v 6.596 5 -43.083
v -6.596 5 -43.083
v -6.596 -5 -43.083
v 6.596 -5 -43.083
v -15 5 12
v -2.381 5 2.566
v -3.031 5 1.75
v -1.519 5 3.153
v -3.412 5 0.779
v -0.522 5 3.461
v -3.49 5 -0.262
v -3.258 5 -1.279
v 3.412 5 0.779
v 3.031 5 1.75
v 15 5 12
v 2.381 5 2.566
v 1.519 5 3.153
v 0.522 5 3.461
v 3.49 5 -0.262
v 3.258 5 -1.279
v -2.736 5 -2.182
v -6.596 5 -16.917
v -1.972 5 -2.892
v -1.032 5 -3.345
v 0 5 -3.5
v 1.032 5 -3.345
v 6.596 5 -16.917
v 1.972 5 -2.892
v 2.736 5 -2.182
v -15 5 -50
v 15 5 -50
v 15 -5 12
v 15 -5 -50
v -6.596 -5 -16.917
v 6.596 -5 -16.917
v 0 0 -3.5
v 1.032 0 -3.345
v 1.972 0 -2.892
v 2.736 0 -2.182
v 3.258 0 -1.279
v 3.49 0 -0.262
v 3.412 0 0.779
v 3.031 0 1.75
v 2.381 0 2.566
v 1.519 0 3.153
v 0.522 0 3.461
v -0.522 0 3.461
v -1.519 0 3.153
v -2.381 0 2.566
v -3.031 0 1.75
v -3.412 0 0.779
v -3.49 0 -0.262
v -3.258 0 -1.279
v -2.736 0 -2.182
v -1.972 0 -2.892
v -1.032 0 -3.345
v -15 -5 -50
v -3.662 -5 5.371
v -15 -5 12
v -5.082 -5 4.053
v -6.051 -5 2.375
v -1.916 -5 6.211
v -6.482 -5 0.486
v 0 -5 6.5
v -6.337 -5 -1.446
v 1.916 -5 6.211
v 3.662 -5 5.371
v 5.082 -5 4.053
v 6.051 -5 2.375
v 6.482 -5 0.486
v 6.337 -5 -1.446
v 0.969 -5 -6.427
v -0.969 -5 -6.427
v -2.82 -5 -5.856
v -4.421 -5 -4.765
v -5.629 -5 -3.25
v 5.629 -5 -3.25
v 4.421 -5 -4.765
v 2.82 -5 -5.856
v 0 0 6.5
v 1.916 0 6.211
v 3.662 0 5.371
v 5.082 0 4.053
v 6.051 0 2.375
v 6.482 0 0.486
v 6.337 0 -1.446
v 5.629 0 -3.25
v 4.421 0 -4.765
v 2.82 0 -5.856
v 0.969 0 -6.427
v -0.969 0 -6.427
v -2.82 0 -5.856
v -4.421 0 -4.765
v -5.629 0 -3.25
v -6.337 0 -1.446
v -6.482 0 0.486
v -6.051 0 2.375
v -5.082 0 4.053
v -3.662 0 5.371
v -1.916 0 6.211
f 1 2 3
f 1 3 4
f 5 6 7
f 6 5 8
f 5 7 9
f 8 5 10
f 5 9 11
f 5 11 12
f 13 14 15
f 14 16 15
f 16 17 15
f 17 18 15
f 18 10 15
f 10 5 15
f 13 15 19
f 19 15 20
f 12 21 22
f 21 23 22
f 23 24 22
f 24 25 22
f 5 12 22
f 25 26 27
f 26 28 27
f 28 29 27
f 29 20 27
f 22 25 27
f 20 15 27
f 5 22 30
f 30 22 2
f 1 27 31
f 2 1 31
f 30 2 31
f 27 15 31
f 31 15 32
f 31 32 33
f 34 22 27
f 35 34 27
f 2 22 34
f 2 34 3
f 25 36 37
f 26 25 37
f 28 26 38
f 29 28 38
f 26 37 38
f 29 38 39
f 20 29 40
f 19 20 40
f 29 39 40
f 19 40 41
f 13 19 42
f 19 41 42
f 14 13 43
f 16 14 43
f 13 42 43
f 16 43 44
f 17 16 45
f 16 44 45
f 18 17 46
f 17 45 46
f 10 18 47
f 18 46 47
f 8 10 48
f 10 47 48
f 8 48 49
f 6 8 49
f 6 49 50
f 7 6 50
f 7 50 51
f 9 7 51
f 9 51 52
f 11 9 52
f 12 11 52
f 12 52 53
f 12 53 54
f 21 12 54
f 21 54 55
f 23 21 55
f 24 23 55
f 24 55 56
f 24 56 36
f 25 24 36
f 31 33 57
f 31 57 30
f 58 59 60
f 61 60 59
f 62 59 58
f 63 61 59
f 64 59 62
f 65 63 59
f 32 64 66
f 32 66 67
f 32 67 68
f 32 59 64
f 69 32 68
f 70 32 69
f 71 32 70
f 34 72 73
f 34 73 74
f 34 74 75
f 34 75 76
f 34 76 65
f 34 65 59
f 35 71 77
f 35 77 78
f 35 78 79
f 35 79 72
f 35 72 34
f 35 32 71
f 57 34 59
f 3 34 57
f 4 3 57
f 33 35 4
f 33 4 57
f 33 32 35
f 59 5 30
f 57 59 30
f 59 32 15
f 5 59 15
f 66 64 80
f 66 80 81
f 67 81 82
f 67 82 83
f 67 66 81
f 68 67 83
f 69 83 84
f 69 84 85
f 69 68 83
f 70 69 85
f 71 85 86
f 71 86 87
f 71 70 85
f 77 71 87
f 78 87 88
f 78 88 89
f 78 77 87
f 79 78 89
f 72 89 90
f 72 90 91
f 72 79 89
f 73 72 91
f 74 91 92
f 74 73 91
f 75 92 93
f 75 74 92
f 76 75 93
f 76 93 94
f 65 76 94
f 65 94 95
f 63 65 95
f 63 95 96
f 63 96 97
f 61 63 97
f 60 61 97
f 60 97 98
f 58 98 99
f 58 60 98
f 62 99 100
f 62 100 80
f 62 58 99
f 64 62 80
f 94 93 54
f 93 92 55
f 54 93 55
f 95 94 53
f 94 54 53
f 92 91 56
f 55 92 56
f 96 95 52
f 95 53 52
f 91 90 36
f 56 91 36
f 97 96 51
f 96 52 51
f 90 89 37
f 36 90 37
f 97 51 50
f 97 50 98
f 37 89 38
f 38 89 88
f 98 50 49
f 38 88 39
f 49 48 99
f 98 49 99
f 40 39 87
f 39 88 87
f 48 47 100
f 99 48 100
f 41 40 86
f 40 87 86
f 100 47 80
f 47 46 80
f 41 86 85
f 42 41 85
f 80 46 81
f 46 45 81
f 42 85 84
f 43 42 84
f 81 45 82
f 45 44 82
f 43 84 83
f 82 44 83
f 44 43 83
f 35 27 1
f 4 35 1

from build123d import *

# Parameters (mm, degrees)
SKETCH_1_W          = 62
SKETCH_1_H          = 10
EXTRUDE_1_DEPTH     = 15
SKETCH_2_R          = 6.5
CUT_EXTRUDE_1_DEPTH = 5
SKETCH_4_R          = 3.5
CUT_EXTRUDE_3_DEPTH = 53.440442409
SKETCH_3_W          = 13.191362224
SKETCH_3_H          = 26.166472608
CUT_EXTRUDE_2_DEPTH = 54.150729064


with BuildPart() as part:
    # 草图1 → 凸台-拉伸1 (new, symmetric)
    with BuildSketch(Plane(origin=(0, 0, 0), x_dir=(0, 0, -1), z_dir=(1, 0, 0))):
        with Locations((19, 0)):
            Rectangle(SKETCH_1_W, SKETCH_1_H)
    extrude(amount=EXTRUDE_1_DEPTH, both=True)

    # 草图2 → 切除-拉伸1 (cut)
    with BuildSketch(Plane(origin=(0, -5, 0), x_dir=(1, 0, 0), z_dir=(0, 1, 0))):
        with Locations(Location((0, 0, 0), (0, 0, 270))):
            Circle(SKETCH_2_R)
    extrude(amount=CUT_EXTRUDE_1_DEPTH, mode=Mode.SUBTRACT)

    # 草图4 → 切除-拉伸3 (cut, through all)
    with BuildSketch(Plane.XZ):
        with Locations(Location((0, 0, 0), (0, 0, 270))):
            Circle(SKETCH_4_R)
    extrude(amount=-CUT_EXTRUDE_3_DEPTH, mode=Mode.SUBTRACT)

    # 草图3 → 切除-拉伸2 (cut, through all)
    with BuildSketch(Plane(origin=(0, 5, 0), x_dir=(1, 0, 0), z_dir=(0, 1, 0))):
        with Locations((0, 30)):
            Rectangle(SKETCH_3_W, SKETCH_3_H)
    extrude(amount=-CUT_EXTRUDE_2_DEPTH, mode=Mode.SUBTRACT)


solid = part.part
